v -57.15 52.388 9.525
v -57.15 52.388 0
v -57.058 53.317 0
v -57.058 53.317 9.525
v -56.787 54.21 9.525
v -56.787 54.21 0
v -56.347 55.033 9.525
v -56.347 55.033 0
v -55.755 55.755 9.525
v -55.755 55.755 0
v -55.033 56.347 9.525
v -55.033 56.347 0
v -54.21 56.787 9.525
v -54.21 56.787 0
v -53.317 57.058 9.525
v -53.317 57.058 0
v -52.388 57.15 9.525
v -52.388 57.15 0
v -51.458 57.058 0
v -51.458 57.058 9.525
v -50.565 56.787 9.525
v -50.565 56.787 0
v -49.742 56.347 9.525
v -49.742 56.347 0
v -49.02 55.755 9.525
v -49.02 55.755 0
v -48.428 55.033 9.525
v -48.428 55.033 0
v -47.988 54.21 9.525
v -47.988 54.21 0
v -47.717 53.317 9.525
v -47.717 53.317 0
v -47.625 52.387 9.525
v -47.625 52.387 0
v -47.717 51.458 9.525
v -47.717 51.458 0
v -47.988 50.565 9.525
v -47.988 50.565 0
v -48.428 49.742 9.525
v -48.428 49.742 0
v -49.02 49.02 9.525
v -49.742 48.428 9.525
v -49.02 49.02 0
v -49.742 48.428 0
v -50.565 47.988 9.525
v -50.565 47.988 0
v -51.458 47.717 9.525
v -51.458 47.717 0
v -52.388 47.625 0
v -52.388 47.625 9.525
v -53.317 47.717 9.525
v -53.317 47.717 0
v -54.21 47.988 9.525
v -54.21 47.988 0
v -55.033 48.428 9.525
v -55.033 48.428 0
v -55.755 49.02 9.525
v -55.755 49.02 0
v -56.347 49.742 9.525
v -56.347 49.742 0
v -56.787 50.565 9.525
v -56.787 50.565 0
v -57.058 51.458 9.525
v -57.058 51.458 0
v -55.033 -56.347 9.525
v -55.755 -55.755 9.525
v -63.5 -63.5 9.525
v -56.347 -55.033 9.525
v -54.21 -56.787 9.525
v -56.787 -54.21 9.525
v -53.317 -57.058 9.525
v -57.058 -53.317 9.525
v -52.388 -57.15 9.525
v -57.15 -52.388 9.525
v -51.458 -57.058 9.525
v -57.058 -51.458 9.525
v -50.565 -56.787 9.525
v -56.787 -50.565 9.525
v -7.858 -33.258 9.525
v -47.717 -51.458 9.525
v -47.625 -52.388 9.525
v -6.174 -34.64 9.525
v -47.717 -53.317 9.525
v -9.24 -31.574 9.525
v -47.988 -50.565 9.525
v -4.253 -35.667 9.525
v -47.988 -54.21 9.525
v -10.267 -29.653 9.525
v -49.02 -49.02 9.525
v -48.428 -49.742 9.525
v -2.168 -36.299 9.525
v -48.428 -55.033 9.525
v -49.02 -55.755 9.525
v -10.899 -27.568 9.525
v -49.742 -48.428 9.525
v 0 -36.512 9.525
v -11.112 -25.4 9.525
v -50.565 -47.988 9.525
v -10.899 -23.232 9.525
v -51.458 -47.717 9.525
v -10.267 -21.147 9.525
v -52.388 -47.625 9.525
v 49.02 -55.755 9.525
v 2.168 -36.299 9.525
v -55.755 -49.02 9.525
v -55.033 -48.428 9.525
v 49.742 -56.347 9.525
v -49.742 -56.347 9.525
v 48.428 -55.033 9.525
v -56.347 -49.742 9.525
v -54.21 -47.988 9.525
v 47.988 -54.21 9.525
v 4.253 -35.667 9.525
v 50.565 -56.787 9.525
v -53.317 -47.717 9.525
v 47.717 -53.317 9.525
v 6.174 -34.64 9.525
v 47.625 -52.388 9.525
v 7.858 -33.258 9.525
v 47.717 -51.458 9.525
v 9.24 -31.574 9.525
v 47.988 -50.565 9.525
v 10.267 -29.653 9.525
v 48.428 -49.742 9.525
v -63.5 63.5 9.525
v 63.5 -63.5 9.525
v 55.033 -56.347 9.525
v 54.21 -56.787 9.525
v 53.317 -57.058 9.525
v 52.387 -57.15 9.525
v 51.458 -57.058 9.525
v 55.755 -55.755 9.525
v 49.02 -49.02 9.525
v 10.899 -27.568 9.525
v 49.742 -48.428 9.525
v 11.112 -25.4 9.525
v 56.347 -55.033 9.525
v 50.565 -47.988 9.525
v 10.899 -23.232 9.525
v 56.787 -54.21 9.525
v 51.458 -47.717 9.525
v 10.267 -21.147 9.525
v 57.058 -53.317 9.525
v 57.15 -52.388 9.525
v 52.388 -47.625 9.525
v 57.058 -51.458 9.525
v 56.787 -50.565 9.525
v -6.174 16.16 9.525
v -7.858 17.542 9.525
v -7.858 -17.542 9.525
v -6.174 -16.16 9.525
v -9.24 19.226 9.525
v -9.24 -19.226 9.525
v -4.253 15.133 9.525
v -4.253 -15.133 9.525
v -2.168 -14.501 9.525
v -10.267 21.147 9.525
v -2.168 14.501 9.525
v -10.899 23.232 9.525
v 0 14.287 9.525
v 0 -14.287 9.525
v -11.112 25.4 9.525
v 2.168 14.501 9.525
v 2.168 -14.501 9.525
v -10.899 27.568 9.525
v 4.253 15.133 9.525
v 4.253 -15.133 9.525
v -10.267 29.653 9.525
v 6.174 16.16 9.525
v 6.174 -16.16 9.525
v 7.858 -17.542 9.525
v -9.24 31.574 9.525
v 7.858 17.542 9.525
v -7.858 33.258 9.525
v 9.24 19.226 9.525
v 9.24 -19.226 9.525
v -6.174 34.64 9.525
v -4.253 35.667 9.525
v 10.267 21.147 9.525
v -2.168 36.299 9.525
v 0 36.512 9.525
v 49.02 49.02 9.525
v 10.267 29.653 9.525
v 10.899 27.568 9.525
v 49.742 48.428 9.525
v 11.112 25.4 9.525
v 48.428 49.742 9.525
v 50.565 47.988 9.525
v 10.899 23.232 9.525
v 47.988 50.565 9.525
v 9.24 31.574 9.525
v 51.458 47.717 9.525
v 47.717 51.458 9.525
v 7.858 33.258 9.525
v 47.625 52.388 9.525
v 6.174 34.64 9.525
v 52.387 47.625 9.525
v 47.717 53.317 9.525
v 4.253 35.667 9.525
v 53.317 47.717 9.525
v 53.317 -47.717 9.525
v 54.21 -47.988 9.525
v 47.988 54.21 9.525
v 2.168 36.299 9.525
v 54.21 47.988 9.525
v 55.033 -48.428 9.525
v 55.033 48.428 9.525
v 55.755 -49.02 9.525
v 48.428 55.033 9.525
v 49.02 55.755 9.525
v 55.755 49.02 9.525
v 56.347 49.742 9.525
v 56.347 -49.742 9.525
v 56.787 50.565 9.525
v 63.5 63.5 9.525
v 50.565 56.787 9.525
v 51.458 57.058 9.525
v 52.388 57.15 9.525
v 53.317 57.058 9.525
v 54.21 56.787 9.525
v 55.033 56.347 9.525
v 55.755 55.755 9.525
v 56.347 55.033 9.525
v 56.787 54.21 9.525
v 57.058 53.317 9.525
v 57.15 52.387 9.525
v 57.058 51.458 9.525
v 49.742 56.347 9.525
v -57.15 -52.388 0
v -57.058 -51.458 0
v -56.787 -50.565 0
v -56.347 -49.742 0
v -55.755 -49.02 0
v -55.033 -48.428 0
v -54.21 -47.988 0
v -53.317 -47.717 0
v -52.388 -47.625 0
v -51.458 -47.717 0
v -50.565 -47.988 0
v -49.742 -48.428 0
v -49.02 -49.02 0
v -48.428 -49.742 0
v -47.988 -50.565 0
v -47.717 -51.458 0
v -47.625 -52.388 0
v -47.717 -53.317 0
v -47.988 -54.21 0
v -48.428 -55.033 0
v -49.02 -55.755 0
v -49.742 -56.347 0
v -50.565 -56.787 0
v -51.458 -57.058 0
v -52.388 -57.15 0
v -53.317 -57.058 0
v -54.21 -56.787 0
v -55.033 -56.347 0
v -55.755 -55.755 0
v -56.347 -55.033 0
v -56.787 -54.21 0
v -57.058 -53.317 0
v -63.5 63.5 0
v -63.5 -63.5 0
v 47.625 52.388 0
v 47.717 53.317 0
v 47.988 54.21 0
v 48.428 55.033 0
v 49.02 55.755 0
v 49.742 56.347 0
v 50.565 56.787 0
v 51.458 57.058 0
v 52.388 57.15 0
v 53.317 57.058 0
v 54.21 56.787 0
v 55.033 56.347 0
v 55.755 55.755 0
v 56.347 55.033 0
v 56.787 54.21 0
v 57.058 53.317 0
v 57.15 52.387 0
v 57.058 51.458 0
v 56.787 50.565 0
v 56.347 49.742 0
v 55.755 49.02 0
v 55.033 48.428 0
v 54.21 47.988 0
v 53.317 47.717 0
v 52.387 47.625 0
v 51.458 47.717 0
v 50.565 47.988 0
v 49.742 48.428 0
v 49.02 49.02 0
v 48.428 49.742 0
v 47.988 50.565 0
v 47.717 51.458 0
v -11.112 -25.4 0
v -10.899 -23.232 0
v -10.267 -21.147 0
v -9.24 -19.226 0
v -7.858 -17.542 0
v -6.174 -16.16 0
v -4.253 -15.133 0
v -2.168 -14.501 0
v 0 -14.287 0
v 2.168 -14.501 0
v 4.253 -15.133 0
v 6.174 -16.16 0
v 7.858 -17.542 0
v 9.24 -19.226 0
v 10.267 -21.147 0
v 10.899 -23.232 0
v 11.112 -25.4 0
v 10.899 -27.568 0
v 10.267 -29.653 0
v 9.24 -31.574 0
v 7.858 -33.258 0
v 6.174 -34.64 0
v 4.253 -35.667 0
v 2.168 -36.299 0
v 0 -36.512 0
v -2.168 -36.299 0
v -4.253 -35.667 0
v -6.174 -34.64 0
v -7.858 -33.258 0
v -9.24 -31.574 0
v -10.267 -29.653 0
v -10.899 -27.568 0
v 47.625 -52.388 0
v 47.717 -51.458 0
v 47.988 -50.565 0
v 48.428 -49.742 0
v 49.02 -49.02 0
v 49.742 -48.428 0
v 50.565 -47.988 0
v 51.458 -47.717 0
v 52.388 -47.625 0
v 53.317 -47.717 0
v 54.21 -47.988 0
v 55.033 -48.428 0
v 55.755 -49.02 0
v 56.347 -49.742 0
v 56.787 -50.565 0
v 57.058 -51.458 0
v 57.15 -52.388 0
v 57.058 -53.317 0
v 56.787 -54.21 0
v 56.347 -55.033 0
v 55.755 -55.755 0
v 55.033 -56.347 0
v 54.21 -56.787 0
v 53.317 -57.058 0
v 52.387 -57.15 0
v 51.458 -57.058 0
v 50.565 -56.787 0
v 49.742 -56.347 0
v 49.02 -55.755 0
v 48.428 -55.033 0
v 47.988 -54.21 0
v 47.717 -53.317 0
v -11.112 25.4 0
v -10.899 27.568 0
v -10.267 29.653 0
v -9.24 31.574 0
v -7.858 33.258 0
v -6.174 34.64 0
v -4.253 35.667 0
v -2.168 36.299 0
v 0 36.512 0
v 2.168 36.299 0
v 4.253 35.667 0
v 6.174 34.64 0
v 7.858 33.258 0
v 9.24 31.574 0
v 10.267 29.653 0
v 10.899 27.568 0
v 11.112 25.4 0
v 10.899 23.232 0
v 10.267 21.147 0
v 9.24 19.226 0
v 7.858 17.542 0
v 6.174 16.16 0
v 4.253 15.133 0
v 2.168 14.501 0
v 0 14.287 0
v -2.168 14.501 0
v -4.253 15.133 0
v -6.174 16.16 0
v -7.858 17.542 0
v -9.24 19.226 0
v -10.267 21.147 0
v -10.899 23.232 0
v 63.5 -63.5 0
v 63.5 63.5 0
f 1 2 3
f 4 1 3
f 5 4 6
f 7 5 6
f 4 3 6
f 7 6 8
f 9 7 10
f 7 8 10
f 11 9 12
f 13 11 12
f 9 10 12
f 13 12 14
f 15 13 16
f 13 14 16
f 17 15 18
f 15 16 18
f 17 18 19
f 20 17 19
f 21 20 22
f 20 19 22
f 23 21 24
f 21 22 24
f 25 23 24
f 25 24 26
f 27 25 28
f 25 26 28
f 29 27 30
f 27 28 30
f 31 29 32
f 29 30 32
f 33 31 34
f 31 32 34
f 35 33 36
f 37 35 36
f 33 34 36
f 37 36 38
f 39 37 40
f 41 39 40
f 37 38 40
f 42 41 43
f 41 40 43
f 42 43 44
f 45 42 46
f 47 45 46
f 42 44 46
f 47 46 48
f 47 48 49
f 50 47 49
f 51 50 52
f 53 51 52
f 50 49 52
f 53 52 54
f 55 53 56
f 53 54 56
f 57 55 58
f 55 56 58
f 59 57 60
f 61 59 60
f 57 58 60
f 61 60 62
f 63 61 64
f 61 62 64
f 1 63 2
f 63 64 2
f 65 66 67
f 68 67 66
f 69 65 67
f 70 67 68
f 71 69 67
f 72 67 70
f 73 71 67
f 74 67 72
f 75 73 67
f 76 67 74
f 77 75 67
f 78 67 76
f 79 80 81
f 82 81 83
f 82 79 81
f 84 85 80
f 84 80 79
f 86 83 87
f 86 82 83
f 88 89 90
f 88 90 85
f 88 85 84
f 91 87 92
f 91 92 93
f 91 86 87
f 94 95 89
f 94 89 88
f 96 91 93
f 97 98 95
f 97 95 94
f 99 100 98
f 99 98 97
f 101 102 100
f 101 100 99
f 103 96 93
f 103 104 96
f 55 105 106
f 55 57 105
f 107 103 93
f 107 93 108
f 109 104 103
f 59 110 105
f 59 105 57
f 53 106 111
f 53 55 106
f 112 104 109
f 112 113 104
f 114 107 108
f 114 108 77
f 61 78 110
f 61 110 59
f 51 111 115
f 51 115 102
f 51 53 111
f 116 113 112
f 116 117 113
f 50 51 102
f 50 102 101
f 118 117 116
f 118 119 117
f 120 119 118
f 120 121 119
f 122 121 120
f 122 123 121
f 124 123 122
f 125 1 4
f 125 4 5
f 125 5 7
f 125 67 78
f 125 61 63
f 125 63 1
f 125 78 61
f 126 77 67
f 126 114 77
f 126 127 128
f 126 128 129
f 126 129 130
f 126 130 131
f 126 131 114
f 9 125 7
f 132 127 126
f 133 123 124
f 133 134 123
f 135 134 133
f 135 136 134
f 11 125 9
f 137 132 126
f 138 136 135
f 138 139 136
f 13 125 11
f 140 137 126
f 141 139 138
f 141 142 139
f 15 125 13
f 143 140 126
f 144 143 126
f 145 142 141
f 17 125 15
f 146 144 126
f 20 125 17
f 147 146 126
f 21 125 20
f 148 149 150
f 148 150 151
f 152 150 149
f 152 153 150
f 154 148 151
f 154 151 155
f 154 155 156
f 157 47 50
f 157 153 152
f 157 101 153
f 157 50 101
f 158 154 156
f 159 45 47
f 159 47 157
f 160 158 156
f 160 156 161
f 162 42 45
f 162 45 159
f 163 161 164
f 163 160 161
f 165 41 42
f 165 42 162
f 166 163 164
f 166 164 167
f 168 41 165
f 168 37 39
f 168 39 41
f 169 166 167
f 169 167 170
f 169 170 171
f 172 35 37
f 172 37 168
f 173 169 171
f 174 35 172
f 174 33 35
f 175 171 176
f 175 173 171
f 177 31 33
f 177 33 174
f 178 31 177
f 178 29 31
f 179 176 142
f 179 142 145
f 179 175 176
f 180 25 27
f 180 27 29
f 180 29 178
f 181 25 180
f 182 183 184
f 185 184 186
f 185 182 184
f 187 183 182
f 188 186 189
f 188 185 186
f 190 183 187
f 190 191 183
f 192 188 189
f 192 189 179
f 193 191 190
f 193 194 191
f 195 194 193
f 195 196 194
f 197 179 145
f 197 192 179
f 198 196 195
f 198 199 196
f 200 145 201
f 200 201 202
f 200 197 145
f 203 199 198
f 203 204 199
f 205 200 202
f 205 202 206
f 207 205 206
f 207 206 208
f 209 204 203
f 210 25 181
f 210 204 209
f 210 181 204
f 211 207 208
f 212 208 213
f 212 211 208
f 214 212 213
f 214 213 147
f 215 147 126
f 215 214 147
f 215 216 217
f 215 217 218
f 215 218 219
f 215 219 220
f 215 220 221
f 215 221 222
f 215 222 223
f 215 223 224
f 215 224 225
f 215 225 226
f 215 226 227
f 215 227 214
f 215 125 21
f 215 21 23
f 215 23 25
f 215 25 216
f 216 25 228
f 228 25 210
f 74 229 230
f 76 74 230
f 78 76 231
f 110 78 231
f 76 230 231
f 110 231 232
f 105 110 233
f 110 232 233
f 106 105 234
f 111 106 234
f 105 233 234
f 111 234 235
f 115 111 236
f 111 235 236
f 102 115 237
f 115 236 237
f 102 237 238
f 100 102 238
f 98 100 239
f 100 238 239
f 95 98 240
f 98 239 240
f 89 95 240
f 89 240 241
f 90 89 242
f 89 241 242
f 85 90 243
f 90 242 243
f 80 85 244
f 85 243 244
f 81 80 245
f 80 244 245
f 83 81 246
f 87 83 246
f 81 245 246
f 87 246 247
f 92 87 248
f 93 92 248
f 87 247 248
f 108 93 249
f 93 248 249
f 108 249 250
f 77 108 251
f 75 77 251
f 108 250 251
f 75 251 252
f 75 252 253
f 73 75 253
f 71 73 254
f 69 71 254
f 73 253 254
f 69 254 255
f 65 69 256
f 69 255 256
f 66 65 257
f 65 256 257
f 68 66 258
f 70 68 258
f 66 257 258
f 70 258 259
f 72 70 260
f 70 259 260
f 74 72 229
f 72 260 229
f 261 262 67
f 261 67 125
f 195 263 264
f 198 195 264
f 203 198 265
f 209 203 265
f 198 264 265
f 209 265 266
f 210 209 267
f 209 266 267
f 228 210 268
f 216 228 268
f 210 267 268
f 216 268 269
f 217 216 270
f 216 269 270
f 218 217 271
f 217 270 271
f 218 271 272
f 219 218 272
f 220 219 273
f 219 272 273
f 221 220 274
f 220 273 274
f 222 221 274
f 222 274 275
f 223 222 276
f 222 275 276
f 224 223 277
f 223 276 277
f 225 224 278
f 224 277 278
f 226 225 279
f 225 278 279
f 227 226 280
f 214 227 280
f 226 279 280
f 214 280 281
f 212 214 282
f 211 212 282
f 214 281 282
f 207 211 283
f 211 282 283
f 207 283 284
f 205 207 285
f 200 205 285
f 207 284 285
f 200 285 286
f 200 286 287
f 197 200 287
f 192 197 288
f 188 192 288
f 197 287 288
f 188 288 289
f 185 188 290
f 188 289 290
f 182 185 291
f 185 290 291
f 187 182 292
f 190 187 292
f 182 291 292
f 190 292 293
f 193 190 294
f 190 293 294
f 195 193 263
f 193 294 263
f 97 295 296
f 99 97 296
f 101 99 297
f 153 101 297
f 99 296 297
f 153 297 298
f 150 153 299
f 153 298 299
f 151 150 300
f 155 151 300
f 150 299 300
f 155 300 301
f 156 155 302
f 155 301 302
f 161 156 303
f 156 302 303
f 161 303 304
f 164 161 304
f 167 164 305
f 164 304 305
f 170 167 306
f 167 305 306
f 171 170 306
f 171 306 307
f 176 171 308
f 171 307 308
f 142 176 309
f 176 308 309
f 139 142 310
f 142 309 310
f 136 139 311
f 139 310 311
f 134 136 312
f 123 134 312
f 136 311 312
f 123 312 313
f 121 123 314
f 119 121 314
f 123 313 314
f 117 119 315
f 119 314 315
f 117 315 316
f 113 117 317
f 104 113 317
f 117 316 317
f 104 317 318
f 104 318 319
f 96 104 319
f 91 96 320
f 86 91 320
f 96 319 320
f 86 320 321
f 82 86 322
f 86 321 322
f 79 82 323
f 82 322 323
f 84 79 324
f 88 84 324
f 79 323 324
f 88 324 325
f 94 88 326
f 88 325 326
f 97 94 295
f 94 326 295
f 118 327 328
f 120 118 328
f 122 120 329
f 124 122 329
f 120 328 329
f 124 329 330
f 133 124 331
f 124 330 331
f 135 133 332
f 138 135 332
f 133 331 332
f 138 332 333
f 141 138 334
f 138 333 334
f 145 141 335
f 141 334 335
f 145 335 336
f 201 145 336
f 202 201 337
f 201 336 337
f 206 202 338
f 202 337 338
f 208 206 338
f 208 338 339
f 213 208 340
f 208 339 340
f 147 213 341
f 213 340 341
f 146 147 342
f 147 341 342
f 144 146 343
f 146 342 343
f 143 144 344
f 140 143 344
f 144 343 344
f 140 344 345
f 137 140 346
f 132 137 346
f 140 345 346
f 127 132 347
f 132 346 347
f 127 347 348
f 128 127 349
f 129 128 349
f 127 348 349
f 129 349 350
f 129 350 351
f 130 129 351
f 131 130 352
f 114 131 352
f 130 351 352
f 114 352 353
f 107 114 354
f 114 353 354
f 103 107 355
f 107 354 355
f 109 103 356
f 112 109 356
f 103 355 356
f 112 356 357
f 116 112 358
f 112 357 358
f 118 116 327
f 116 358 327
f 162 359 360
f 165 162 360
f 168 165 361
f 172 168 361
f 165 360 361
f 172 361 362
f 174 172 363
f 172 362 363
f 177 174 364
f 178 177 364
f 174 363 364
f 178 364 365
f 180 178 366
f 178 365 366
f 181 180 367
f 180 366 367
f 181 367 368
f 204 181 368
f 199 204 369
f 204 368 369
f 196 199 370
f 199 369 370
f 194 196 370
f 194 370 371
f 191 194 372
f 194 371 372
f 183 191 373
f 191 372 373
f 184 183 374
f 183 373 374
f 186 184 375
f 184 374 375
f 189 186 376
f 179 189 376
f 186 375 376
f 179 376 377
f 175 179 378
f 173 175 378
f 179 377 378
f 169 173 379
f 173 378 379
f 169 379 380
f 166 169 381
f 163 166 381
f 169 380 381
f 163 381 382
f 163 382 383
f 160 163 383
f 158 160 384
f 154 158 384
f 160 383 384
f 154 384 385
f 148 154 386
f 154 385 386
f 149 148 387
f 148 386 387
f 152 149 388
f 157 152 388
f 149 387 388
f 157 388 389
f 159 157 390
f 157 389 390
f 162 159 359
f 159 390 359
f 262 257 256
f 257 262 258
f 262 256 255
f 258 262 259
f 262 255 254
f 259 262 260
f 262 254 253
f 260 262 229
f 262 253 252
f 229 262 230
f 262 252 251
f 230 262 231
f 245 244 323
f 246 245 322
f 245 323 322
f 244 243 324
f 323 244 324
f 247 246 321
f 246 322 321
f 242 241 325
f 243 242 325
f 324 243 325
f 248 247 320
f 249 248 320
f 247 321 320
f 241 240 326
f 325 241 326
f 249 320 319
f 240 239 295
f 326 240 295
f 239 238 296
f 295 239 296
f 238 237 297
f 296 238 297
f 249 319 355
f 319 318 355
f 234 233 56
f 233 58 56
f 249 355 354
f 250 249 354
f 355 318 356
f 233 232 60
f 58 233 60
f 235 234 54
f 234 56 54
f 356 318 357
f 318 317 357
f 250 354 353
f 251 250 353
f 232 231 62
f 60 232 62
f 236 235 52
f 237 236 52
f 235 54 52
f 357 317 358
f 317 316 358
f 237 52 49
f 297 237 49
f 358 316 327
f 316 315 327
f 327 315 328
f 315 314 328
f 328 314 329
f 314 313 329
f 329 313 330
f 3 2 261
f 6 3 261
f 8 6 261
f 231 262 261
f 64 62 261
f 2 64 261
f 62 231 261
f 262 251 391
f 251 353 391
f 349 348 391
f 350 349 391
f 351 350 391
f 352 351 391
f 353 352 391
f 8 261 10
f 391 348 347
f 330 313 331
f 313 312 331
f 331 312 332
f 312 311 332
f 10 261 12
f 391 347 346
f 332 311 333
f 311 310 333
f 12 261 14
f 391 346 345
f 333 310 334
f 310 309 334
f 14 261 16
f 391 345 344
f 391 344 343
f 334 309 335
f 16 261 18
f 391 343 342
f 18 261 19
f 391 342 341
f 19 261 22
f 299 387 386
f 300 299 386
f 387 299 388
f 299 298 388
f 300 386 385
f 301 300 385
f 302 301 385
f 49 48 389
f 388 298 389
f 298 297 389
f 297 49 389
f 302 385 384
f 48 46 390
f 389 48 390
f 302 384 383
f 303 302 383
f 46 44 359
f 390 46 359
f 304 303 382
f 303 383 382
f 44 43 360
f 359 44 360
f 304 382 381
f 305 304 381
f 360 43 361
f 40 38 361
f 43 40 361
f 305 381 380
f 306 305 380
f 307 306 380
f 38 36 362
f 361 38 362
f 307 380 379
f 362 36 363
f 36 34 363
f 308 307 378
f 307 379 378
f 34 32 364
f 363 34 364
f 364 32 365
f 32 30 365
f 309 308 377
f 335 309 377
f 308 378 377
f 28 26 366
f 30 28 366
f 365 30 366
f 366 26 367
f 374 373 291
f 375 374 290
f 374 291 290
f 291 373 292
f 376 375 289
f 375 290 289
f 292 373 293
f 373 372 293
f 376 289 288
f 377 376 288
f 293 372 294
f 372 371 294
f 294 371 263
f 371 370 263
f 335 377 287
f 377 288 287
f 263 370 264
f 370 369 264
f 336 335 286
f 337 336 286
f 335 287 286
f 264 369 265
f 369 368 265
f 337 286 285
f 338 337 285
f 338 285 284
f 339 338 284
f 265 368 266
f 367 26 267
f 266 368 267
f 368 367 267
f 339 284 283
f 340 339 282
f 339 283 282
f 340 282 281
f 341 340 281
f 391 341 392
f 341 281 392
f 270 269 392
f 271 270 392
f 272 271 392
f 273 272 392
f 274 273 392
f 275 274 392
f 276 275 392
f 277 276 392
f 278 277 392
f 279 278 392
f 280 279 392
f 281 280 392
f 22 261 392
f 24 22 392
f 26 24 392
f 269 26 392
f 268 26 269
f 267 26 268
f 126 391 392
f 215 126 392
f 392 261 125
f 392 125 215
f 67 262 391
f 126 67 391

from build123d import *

# Parameters (mm, degrees)
SKETCH1_W           = 127
SKETCH1_H           = 127
BOSS_EXTRUDE1_DEPTH = 9.525
SKETCH2_R           = 11.1125
CUT_EXTRUDE1_DEPTH  = 9.525
SKETCH3_R           = 4.7625
CUT_EXTRUDE2_DEPTH  = 9.525


with BuildPart() as part:
    # Sketch1 → Boss-Extrude1 (new body)
    with BuildSketch(Plane.XY):
        Rectangle(SKETCH1_W, SKETCH1_H)
    extrude(amount=BOSS_EXTRUDE1_DEPTH)

    # Sketch2 → Cut-Extrude1 (cut)
    with BuildSketch(Plane(origin=(0, 0, 0), x_dir=(-1, 0, 0), z_dir=(0, 0, -1))):
        with Locations((0, 25.4)):
            Circle(SKETCH2_R)
        with Locations((0, -25.4)):
            Circle(SKETCH2_R)
    extrude(amount=-CUT_EXTRUDE1_DEPTH, mode=Mode.SUBTRACT)

    # Sketch3 → Cut-Extrude2 (cut)
    with BuildSketch(Plane(origin=(0, 0, 0), x_dir=(-1, 0, 0), z_dir=(0, 0, -1))):
        with Locations((52.3875, 52.3875)):
            Circle(SKETCH3_R)
        with Locations((52.3875, -52.3875)):
            Circle(SKETCH3_R)
        with Locations((-52.3875, 52.3875)):
            Circle(SKETCH3_R)
        with Locations((-52.3875, -52.3875)):
            Circle(SKETCH3_R)
    extrude(amount=-CUT_EXTRUDE2_DEPTH, mode=Mode.SUBTRACT)


solid = part.part
